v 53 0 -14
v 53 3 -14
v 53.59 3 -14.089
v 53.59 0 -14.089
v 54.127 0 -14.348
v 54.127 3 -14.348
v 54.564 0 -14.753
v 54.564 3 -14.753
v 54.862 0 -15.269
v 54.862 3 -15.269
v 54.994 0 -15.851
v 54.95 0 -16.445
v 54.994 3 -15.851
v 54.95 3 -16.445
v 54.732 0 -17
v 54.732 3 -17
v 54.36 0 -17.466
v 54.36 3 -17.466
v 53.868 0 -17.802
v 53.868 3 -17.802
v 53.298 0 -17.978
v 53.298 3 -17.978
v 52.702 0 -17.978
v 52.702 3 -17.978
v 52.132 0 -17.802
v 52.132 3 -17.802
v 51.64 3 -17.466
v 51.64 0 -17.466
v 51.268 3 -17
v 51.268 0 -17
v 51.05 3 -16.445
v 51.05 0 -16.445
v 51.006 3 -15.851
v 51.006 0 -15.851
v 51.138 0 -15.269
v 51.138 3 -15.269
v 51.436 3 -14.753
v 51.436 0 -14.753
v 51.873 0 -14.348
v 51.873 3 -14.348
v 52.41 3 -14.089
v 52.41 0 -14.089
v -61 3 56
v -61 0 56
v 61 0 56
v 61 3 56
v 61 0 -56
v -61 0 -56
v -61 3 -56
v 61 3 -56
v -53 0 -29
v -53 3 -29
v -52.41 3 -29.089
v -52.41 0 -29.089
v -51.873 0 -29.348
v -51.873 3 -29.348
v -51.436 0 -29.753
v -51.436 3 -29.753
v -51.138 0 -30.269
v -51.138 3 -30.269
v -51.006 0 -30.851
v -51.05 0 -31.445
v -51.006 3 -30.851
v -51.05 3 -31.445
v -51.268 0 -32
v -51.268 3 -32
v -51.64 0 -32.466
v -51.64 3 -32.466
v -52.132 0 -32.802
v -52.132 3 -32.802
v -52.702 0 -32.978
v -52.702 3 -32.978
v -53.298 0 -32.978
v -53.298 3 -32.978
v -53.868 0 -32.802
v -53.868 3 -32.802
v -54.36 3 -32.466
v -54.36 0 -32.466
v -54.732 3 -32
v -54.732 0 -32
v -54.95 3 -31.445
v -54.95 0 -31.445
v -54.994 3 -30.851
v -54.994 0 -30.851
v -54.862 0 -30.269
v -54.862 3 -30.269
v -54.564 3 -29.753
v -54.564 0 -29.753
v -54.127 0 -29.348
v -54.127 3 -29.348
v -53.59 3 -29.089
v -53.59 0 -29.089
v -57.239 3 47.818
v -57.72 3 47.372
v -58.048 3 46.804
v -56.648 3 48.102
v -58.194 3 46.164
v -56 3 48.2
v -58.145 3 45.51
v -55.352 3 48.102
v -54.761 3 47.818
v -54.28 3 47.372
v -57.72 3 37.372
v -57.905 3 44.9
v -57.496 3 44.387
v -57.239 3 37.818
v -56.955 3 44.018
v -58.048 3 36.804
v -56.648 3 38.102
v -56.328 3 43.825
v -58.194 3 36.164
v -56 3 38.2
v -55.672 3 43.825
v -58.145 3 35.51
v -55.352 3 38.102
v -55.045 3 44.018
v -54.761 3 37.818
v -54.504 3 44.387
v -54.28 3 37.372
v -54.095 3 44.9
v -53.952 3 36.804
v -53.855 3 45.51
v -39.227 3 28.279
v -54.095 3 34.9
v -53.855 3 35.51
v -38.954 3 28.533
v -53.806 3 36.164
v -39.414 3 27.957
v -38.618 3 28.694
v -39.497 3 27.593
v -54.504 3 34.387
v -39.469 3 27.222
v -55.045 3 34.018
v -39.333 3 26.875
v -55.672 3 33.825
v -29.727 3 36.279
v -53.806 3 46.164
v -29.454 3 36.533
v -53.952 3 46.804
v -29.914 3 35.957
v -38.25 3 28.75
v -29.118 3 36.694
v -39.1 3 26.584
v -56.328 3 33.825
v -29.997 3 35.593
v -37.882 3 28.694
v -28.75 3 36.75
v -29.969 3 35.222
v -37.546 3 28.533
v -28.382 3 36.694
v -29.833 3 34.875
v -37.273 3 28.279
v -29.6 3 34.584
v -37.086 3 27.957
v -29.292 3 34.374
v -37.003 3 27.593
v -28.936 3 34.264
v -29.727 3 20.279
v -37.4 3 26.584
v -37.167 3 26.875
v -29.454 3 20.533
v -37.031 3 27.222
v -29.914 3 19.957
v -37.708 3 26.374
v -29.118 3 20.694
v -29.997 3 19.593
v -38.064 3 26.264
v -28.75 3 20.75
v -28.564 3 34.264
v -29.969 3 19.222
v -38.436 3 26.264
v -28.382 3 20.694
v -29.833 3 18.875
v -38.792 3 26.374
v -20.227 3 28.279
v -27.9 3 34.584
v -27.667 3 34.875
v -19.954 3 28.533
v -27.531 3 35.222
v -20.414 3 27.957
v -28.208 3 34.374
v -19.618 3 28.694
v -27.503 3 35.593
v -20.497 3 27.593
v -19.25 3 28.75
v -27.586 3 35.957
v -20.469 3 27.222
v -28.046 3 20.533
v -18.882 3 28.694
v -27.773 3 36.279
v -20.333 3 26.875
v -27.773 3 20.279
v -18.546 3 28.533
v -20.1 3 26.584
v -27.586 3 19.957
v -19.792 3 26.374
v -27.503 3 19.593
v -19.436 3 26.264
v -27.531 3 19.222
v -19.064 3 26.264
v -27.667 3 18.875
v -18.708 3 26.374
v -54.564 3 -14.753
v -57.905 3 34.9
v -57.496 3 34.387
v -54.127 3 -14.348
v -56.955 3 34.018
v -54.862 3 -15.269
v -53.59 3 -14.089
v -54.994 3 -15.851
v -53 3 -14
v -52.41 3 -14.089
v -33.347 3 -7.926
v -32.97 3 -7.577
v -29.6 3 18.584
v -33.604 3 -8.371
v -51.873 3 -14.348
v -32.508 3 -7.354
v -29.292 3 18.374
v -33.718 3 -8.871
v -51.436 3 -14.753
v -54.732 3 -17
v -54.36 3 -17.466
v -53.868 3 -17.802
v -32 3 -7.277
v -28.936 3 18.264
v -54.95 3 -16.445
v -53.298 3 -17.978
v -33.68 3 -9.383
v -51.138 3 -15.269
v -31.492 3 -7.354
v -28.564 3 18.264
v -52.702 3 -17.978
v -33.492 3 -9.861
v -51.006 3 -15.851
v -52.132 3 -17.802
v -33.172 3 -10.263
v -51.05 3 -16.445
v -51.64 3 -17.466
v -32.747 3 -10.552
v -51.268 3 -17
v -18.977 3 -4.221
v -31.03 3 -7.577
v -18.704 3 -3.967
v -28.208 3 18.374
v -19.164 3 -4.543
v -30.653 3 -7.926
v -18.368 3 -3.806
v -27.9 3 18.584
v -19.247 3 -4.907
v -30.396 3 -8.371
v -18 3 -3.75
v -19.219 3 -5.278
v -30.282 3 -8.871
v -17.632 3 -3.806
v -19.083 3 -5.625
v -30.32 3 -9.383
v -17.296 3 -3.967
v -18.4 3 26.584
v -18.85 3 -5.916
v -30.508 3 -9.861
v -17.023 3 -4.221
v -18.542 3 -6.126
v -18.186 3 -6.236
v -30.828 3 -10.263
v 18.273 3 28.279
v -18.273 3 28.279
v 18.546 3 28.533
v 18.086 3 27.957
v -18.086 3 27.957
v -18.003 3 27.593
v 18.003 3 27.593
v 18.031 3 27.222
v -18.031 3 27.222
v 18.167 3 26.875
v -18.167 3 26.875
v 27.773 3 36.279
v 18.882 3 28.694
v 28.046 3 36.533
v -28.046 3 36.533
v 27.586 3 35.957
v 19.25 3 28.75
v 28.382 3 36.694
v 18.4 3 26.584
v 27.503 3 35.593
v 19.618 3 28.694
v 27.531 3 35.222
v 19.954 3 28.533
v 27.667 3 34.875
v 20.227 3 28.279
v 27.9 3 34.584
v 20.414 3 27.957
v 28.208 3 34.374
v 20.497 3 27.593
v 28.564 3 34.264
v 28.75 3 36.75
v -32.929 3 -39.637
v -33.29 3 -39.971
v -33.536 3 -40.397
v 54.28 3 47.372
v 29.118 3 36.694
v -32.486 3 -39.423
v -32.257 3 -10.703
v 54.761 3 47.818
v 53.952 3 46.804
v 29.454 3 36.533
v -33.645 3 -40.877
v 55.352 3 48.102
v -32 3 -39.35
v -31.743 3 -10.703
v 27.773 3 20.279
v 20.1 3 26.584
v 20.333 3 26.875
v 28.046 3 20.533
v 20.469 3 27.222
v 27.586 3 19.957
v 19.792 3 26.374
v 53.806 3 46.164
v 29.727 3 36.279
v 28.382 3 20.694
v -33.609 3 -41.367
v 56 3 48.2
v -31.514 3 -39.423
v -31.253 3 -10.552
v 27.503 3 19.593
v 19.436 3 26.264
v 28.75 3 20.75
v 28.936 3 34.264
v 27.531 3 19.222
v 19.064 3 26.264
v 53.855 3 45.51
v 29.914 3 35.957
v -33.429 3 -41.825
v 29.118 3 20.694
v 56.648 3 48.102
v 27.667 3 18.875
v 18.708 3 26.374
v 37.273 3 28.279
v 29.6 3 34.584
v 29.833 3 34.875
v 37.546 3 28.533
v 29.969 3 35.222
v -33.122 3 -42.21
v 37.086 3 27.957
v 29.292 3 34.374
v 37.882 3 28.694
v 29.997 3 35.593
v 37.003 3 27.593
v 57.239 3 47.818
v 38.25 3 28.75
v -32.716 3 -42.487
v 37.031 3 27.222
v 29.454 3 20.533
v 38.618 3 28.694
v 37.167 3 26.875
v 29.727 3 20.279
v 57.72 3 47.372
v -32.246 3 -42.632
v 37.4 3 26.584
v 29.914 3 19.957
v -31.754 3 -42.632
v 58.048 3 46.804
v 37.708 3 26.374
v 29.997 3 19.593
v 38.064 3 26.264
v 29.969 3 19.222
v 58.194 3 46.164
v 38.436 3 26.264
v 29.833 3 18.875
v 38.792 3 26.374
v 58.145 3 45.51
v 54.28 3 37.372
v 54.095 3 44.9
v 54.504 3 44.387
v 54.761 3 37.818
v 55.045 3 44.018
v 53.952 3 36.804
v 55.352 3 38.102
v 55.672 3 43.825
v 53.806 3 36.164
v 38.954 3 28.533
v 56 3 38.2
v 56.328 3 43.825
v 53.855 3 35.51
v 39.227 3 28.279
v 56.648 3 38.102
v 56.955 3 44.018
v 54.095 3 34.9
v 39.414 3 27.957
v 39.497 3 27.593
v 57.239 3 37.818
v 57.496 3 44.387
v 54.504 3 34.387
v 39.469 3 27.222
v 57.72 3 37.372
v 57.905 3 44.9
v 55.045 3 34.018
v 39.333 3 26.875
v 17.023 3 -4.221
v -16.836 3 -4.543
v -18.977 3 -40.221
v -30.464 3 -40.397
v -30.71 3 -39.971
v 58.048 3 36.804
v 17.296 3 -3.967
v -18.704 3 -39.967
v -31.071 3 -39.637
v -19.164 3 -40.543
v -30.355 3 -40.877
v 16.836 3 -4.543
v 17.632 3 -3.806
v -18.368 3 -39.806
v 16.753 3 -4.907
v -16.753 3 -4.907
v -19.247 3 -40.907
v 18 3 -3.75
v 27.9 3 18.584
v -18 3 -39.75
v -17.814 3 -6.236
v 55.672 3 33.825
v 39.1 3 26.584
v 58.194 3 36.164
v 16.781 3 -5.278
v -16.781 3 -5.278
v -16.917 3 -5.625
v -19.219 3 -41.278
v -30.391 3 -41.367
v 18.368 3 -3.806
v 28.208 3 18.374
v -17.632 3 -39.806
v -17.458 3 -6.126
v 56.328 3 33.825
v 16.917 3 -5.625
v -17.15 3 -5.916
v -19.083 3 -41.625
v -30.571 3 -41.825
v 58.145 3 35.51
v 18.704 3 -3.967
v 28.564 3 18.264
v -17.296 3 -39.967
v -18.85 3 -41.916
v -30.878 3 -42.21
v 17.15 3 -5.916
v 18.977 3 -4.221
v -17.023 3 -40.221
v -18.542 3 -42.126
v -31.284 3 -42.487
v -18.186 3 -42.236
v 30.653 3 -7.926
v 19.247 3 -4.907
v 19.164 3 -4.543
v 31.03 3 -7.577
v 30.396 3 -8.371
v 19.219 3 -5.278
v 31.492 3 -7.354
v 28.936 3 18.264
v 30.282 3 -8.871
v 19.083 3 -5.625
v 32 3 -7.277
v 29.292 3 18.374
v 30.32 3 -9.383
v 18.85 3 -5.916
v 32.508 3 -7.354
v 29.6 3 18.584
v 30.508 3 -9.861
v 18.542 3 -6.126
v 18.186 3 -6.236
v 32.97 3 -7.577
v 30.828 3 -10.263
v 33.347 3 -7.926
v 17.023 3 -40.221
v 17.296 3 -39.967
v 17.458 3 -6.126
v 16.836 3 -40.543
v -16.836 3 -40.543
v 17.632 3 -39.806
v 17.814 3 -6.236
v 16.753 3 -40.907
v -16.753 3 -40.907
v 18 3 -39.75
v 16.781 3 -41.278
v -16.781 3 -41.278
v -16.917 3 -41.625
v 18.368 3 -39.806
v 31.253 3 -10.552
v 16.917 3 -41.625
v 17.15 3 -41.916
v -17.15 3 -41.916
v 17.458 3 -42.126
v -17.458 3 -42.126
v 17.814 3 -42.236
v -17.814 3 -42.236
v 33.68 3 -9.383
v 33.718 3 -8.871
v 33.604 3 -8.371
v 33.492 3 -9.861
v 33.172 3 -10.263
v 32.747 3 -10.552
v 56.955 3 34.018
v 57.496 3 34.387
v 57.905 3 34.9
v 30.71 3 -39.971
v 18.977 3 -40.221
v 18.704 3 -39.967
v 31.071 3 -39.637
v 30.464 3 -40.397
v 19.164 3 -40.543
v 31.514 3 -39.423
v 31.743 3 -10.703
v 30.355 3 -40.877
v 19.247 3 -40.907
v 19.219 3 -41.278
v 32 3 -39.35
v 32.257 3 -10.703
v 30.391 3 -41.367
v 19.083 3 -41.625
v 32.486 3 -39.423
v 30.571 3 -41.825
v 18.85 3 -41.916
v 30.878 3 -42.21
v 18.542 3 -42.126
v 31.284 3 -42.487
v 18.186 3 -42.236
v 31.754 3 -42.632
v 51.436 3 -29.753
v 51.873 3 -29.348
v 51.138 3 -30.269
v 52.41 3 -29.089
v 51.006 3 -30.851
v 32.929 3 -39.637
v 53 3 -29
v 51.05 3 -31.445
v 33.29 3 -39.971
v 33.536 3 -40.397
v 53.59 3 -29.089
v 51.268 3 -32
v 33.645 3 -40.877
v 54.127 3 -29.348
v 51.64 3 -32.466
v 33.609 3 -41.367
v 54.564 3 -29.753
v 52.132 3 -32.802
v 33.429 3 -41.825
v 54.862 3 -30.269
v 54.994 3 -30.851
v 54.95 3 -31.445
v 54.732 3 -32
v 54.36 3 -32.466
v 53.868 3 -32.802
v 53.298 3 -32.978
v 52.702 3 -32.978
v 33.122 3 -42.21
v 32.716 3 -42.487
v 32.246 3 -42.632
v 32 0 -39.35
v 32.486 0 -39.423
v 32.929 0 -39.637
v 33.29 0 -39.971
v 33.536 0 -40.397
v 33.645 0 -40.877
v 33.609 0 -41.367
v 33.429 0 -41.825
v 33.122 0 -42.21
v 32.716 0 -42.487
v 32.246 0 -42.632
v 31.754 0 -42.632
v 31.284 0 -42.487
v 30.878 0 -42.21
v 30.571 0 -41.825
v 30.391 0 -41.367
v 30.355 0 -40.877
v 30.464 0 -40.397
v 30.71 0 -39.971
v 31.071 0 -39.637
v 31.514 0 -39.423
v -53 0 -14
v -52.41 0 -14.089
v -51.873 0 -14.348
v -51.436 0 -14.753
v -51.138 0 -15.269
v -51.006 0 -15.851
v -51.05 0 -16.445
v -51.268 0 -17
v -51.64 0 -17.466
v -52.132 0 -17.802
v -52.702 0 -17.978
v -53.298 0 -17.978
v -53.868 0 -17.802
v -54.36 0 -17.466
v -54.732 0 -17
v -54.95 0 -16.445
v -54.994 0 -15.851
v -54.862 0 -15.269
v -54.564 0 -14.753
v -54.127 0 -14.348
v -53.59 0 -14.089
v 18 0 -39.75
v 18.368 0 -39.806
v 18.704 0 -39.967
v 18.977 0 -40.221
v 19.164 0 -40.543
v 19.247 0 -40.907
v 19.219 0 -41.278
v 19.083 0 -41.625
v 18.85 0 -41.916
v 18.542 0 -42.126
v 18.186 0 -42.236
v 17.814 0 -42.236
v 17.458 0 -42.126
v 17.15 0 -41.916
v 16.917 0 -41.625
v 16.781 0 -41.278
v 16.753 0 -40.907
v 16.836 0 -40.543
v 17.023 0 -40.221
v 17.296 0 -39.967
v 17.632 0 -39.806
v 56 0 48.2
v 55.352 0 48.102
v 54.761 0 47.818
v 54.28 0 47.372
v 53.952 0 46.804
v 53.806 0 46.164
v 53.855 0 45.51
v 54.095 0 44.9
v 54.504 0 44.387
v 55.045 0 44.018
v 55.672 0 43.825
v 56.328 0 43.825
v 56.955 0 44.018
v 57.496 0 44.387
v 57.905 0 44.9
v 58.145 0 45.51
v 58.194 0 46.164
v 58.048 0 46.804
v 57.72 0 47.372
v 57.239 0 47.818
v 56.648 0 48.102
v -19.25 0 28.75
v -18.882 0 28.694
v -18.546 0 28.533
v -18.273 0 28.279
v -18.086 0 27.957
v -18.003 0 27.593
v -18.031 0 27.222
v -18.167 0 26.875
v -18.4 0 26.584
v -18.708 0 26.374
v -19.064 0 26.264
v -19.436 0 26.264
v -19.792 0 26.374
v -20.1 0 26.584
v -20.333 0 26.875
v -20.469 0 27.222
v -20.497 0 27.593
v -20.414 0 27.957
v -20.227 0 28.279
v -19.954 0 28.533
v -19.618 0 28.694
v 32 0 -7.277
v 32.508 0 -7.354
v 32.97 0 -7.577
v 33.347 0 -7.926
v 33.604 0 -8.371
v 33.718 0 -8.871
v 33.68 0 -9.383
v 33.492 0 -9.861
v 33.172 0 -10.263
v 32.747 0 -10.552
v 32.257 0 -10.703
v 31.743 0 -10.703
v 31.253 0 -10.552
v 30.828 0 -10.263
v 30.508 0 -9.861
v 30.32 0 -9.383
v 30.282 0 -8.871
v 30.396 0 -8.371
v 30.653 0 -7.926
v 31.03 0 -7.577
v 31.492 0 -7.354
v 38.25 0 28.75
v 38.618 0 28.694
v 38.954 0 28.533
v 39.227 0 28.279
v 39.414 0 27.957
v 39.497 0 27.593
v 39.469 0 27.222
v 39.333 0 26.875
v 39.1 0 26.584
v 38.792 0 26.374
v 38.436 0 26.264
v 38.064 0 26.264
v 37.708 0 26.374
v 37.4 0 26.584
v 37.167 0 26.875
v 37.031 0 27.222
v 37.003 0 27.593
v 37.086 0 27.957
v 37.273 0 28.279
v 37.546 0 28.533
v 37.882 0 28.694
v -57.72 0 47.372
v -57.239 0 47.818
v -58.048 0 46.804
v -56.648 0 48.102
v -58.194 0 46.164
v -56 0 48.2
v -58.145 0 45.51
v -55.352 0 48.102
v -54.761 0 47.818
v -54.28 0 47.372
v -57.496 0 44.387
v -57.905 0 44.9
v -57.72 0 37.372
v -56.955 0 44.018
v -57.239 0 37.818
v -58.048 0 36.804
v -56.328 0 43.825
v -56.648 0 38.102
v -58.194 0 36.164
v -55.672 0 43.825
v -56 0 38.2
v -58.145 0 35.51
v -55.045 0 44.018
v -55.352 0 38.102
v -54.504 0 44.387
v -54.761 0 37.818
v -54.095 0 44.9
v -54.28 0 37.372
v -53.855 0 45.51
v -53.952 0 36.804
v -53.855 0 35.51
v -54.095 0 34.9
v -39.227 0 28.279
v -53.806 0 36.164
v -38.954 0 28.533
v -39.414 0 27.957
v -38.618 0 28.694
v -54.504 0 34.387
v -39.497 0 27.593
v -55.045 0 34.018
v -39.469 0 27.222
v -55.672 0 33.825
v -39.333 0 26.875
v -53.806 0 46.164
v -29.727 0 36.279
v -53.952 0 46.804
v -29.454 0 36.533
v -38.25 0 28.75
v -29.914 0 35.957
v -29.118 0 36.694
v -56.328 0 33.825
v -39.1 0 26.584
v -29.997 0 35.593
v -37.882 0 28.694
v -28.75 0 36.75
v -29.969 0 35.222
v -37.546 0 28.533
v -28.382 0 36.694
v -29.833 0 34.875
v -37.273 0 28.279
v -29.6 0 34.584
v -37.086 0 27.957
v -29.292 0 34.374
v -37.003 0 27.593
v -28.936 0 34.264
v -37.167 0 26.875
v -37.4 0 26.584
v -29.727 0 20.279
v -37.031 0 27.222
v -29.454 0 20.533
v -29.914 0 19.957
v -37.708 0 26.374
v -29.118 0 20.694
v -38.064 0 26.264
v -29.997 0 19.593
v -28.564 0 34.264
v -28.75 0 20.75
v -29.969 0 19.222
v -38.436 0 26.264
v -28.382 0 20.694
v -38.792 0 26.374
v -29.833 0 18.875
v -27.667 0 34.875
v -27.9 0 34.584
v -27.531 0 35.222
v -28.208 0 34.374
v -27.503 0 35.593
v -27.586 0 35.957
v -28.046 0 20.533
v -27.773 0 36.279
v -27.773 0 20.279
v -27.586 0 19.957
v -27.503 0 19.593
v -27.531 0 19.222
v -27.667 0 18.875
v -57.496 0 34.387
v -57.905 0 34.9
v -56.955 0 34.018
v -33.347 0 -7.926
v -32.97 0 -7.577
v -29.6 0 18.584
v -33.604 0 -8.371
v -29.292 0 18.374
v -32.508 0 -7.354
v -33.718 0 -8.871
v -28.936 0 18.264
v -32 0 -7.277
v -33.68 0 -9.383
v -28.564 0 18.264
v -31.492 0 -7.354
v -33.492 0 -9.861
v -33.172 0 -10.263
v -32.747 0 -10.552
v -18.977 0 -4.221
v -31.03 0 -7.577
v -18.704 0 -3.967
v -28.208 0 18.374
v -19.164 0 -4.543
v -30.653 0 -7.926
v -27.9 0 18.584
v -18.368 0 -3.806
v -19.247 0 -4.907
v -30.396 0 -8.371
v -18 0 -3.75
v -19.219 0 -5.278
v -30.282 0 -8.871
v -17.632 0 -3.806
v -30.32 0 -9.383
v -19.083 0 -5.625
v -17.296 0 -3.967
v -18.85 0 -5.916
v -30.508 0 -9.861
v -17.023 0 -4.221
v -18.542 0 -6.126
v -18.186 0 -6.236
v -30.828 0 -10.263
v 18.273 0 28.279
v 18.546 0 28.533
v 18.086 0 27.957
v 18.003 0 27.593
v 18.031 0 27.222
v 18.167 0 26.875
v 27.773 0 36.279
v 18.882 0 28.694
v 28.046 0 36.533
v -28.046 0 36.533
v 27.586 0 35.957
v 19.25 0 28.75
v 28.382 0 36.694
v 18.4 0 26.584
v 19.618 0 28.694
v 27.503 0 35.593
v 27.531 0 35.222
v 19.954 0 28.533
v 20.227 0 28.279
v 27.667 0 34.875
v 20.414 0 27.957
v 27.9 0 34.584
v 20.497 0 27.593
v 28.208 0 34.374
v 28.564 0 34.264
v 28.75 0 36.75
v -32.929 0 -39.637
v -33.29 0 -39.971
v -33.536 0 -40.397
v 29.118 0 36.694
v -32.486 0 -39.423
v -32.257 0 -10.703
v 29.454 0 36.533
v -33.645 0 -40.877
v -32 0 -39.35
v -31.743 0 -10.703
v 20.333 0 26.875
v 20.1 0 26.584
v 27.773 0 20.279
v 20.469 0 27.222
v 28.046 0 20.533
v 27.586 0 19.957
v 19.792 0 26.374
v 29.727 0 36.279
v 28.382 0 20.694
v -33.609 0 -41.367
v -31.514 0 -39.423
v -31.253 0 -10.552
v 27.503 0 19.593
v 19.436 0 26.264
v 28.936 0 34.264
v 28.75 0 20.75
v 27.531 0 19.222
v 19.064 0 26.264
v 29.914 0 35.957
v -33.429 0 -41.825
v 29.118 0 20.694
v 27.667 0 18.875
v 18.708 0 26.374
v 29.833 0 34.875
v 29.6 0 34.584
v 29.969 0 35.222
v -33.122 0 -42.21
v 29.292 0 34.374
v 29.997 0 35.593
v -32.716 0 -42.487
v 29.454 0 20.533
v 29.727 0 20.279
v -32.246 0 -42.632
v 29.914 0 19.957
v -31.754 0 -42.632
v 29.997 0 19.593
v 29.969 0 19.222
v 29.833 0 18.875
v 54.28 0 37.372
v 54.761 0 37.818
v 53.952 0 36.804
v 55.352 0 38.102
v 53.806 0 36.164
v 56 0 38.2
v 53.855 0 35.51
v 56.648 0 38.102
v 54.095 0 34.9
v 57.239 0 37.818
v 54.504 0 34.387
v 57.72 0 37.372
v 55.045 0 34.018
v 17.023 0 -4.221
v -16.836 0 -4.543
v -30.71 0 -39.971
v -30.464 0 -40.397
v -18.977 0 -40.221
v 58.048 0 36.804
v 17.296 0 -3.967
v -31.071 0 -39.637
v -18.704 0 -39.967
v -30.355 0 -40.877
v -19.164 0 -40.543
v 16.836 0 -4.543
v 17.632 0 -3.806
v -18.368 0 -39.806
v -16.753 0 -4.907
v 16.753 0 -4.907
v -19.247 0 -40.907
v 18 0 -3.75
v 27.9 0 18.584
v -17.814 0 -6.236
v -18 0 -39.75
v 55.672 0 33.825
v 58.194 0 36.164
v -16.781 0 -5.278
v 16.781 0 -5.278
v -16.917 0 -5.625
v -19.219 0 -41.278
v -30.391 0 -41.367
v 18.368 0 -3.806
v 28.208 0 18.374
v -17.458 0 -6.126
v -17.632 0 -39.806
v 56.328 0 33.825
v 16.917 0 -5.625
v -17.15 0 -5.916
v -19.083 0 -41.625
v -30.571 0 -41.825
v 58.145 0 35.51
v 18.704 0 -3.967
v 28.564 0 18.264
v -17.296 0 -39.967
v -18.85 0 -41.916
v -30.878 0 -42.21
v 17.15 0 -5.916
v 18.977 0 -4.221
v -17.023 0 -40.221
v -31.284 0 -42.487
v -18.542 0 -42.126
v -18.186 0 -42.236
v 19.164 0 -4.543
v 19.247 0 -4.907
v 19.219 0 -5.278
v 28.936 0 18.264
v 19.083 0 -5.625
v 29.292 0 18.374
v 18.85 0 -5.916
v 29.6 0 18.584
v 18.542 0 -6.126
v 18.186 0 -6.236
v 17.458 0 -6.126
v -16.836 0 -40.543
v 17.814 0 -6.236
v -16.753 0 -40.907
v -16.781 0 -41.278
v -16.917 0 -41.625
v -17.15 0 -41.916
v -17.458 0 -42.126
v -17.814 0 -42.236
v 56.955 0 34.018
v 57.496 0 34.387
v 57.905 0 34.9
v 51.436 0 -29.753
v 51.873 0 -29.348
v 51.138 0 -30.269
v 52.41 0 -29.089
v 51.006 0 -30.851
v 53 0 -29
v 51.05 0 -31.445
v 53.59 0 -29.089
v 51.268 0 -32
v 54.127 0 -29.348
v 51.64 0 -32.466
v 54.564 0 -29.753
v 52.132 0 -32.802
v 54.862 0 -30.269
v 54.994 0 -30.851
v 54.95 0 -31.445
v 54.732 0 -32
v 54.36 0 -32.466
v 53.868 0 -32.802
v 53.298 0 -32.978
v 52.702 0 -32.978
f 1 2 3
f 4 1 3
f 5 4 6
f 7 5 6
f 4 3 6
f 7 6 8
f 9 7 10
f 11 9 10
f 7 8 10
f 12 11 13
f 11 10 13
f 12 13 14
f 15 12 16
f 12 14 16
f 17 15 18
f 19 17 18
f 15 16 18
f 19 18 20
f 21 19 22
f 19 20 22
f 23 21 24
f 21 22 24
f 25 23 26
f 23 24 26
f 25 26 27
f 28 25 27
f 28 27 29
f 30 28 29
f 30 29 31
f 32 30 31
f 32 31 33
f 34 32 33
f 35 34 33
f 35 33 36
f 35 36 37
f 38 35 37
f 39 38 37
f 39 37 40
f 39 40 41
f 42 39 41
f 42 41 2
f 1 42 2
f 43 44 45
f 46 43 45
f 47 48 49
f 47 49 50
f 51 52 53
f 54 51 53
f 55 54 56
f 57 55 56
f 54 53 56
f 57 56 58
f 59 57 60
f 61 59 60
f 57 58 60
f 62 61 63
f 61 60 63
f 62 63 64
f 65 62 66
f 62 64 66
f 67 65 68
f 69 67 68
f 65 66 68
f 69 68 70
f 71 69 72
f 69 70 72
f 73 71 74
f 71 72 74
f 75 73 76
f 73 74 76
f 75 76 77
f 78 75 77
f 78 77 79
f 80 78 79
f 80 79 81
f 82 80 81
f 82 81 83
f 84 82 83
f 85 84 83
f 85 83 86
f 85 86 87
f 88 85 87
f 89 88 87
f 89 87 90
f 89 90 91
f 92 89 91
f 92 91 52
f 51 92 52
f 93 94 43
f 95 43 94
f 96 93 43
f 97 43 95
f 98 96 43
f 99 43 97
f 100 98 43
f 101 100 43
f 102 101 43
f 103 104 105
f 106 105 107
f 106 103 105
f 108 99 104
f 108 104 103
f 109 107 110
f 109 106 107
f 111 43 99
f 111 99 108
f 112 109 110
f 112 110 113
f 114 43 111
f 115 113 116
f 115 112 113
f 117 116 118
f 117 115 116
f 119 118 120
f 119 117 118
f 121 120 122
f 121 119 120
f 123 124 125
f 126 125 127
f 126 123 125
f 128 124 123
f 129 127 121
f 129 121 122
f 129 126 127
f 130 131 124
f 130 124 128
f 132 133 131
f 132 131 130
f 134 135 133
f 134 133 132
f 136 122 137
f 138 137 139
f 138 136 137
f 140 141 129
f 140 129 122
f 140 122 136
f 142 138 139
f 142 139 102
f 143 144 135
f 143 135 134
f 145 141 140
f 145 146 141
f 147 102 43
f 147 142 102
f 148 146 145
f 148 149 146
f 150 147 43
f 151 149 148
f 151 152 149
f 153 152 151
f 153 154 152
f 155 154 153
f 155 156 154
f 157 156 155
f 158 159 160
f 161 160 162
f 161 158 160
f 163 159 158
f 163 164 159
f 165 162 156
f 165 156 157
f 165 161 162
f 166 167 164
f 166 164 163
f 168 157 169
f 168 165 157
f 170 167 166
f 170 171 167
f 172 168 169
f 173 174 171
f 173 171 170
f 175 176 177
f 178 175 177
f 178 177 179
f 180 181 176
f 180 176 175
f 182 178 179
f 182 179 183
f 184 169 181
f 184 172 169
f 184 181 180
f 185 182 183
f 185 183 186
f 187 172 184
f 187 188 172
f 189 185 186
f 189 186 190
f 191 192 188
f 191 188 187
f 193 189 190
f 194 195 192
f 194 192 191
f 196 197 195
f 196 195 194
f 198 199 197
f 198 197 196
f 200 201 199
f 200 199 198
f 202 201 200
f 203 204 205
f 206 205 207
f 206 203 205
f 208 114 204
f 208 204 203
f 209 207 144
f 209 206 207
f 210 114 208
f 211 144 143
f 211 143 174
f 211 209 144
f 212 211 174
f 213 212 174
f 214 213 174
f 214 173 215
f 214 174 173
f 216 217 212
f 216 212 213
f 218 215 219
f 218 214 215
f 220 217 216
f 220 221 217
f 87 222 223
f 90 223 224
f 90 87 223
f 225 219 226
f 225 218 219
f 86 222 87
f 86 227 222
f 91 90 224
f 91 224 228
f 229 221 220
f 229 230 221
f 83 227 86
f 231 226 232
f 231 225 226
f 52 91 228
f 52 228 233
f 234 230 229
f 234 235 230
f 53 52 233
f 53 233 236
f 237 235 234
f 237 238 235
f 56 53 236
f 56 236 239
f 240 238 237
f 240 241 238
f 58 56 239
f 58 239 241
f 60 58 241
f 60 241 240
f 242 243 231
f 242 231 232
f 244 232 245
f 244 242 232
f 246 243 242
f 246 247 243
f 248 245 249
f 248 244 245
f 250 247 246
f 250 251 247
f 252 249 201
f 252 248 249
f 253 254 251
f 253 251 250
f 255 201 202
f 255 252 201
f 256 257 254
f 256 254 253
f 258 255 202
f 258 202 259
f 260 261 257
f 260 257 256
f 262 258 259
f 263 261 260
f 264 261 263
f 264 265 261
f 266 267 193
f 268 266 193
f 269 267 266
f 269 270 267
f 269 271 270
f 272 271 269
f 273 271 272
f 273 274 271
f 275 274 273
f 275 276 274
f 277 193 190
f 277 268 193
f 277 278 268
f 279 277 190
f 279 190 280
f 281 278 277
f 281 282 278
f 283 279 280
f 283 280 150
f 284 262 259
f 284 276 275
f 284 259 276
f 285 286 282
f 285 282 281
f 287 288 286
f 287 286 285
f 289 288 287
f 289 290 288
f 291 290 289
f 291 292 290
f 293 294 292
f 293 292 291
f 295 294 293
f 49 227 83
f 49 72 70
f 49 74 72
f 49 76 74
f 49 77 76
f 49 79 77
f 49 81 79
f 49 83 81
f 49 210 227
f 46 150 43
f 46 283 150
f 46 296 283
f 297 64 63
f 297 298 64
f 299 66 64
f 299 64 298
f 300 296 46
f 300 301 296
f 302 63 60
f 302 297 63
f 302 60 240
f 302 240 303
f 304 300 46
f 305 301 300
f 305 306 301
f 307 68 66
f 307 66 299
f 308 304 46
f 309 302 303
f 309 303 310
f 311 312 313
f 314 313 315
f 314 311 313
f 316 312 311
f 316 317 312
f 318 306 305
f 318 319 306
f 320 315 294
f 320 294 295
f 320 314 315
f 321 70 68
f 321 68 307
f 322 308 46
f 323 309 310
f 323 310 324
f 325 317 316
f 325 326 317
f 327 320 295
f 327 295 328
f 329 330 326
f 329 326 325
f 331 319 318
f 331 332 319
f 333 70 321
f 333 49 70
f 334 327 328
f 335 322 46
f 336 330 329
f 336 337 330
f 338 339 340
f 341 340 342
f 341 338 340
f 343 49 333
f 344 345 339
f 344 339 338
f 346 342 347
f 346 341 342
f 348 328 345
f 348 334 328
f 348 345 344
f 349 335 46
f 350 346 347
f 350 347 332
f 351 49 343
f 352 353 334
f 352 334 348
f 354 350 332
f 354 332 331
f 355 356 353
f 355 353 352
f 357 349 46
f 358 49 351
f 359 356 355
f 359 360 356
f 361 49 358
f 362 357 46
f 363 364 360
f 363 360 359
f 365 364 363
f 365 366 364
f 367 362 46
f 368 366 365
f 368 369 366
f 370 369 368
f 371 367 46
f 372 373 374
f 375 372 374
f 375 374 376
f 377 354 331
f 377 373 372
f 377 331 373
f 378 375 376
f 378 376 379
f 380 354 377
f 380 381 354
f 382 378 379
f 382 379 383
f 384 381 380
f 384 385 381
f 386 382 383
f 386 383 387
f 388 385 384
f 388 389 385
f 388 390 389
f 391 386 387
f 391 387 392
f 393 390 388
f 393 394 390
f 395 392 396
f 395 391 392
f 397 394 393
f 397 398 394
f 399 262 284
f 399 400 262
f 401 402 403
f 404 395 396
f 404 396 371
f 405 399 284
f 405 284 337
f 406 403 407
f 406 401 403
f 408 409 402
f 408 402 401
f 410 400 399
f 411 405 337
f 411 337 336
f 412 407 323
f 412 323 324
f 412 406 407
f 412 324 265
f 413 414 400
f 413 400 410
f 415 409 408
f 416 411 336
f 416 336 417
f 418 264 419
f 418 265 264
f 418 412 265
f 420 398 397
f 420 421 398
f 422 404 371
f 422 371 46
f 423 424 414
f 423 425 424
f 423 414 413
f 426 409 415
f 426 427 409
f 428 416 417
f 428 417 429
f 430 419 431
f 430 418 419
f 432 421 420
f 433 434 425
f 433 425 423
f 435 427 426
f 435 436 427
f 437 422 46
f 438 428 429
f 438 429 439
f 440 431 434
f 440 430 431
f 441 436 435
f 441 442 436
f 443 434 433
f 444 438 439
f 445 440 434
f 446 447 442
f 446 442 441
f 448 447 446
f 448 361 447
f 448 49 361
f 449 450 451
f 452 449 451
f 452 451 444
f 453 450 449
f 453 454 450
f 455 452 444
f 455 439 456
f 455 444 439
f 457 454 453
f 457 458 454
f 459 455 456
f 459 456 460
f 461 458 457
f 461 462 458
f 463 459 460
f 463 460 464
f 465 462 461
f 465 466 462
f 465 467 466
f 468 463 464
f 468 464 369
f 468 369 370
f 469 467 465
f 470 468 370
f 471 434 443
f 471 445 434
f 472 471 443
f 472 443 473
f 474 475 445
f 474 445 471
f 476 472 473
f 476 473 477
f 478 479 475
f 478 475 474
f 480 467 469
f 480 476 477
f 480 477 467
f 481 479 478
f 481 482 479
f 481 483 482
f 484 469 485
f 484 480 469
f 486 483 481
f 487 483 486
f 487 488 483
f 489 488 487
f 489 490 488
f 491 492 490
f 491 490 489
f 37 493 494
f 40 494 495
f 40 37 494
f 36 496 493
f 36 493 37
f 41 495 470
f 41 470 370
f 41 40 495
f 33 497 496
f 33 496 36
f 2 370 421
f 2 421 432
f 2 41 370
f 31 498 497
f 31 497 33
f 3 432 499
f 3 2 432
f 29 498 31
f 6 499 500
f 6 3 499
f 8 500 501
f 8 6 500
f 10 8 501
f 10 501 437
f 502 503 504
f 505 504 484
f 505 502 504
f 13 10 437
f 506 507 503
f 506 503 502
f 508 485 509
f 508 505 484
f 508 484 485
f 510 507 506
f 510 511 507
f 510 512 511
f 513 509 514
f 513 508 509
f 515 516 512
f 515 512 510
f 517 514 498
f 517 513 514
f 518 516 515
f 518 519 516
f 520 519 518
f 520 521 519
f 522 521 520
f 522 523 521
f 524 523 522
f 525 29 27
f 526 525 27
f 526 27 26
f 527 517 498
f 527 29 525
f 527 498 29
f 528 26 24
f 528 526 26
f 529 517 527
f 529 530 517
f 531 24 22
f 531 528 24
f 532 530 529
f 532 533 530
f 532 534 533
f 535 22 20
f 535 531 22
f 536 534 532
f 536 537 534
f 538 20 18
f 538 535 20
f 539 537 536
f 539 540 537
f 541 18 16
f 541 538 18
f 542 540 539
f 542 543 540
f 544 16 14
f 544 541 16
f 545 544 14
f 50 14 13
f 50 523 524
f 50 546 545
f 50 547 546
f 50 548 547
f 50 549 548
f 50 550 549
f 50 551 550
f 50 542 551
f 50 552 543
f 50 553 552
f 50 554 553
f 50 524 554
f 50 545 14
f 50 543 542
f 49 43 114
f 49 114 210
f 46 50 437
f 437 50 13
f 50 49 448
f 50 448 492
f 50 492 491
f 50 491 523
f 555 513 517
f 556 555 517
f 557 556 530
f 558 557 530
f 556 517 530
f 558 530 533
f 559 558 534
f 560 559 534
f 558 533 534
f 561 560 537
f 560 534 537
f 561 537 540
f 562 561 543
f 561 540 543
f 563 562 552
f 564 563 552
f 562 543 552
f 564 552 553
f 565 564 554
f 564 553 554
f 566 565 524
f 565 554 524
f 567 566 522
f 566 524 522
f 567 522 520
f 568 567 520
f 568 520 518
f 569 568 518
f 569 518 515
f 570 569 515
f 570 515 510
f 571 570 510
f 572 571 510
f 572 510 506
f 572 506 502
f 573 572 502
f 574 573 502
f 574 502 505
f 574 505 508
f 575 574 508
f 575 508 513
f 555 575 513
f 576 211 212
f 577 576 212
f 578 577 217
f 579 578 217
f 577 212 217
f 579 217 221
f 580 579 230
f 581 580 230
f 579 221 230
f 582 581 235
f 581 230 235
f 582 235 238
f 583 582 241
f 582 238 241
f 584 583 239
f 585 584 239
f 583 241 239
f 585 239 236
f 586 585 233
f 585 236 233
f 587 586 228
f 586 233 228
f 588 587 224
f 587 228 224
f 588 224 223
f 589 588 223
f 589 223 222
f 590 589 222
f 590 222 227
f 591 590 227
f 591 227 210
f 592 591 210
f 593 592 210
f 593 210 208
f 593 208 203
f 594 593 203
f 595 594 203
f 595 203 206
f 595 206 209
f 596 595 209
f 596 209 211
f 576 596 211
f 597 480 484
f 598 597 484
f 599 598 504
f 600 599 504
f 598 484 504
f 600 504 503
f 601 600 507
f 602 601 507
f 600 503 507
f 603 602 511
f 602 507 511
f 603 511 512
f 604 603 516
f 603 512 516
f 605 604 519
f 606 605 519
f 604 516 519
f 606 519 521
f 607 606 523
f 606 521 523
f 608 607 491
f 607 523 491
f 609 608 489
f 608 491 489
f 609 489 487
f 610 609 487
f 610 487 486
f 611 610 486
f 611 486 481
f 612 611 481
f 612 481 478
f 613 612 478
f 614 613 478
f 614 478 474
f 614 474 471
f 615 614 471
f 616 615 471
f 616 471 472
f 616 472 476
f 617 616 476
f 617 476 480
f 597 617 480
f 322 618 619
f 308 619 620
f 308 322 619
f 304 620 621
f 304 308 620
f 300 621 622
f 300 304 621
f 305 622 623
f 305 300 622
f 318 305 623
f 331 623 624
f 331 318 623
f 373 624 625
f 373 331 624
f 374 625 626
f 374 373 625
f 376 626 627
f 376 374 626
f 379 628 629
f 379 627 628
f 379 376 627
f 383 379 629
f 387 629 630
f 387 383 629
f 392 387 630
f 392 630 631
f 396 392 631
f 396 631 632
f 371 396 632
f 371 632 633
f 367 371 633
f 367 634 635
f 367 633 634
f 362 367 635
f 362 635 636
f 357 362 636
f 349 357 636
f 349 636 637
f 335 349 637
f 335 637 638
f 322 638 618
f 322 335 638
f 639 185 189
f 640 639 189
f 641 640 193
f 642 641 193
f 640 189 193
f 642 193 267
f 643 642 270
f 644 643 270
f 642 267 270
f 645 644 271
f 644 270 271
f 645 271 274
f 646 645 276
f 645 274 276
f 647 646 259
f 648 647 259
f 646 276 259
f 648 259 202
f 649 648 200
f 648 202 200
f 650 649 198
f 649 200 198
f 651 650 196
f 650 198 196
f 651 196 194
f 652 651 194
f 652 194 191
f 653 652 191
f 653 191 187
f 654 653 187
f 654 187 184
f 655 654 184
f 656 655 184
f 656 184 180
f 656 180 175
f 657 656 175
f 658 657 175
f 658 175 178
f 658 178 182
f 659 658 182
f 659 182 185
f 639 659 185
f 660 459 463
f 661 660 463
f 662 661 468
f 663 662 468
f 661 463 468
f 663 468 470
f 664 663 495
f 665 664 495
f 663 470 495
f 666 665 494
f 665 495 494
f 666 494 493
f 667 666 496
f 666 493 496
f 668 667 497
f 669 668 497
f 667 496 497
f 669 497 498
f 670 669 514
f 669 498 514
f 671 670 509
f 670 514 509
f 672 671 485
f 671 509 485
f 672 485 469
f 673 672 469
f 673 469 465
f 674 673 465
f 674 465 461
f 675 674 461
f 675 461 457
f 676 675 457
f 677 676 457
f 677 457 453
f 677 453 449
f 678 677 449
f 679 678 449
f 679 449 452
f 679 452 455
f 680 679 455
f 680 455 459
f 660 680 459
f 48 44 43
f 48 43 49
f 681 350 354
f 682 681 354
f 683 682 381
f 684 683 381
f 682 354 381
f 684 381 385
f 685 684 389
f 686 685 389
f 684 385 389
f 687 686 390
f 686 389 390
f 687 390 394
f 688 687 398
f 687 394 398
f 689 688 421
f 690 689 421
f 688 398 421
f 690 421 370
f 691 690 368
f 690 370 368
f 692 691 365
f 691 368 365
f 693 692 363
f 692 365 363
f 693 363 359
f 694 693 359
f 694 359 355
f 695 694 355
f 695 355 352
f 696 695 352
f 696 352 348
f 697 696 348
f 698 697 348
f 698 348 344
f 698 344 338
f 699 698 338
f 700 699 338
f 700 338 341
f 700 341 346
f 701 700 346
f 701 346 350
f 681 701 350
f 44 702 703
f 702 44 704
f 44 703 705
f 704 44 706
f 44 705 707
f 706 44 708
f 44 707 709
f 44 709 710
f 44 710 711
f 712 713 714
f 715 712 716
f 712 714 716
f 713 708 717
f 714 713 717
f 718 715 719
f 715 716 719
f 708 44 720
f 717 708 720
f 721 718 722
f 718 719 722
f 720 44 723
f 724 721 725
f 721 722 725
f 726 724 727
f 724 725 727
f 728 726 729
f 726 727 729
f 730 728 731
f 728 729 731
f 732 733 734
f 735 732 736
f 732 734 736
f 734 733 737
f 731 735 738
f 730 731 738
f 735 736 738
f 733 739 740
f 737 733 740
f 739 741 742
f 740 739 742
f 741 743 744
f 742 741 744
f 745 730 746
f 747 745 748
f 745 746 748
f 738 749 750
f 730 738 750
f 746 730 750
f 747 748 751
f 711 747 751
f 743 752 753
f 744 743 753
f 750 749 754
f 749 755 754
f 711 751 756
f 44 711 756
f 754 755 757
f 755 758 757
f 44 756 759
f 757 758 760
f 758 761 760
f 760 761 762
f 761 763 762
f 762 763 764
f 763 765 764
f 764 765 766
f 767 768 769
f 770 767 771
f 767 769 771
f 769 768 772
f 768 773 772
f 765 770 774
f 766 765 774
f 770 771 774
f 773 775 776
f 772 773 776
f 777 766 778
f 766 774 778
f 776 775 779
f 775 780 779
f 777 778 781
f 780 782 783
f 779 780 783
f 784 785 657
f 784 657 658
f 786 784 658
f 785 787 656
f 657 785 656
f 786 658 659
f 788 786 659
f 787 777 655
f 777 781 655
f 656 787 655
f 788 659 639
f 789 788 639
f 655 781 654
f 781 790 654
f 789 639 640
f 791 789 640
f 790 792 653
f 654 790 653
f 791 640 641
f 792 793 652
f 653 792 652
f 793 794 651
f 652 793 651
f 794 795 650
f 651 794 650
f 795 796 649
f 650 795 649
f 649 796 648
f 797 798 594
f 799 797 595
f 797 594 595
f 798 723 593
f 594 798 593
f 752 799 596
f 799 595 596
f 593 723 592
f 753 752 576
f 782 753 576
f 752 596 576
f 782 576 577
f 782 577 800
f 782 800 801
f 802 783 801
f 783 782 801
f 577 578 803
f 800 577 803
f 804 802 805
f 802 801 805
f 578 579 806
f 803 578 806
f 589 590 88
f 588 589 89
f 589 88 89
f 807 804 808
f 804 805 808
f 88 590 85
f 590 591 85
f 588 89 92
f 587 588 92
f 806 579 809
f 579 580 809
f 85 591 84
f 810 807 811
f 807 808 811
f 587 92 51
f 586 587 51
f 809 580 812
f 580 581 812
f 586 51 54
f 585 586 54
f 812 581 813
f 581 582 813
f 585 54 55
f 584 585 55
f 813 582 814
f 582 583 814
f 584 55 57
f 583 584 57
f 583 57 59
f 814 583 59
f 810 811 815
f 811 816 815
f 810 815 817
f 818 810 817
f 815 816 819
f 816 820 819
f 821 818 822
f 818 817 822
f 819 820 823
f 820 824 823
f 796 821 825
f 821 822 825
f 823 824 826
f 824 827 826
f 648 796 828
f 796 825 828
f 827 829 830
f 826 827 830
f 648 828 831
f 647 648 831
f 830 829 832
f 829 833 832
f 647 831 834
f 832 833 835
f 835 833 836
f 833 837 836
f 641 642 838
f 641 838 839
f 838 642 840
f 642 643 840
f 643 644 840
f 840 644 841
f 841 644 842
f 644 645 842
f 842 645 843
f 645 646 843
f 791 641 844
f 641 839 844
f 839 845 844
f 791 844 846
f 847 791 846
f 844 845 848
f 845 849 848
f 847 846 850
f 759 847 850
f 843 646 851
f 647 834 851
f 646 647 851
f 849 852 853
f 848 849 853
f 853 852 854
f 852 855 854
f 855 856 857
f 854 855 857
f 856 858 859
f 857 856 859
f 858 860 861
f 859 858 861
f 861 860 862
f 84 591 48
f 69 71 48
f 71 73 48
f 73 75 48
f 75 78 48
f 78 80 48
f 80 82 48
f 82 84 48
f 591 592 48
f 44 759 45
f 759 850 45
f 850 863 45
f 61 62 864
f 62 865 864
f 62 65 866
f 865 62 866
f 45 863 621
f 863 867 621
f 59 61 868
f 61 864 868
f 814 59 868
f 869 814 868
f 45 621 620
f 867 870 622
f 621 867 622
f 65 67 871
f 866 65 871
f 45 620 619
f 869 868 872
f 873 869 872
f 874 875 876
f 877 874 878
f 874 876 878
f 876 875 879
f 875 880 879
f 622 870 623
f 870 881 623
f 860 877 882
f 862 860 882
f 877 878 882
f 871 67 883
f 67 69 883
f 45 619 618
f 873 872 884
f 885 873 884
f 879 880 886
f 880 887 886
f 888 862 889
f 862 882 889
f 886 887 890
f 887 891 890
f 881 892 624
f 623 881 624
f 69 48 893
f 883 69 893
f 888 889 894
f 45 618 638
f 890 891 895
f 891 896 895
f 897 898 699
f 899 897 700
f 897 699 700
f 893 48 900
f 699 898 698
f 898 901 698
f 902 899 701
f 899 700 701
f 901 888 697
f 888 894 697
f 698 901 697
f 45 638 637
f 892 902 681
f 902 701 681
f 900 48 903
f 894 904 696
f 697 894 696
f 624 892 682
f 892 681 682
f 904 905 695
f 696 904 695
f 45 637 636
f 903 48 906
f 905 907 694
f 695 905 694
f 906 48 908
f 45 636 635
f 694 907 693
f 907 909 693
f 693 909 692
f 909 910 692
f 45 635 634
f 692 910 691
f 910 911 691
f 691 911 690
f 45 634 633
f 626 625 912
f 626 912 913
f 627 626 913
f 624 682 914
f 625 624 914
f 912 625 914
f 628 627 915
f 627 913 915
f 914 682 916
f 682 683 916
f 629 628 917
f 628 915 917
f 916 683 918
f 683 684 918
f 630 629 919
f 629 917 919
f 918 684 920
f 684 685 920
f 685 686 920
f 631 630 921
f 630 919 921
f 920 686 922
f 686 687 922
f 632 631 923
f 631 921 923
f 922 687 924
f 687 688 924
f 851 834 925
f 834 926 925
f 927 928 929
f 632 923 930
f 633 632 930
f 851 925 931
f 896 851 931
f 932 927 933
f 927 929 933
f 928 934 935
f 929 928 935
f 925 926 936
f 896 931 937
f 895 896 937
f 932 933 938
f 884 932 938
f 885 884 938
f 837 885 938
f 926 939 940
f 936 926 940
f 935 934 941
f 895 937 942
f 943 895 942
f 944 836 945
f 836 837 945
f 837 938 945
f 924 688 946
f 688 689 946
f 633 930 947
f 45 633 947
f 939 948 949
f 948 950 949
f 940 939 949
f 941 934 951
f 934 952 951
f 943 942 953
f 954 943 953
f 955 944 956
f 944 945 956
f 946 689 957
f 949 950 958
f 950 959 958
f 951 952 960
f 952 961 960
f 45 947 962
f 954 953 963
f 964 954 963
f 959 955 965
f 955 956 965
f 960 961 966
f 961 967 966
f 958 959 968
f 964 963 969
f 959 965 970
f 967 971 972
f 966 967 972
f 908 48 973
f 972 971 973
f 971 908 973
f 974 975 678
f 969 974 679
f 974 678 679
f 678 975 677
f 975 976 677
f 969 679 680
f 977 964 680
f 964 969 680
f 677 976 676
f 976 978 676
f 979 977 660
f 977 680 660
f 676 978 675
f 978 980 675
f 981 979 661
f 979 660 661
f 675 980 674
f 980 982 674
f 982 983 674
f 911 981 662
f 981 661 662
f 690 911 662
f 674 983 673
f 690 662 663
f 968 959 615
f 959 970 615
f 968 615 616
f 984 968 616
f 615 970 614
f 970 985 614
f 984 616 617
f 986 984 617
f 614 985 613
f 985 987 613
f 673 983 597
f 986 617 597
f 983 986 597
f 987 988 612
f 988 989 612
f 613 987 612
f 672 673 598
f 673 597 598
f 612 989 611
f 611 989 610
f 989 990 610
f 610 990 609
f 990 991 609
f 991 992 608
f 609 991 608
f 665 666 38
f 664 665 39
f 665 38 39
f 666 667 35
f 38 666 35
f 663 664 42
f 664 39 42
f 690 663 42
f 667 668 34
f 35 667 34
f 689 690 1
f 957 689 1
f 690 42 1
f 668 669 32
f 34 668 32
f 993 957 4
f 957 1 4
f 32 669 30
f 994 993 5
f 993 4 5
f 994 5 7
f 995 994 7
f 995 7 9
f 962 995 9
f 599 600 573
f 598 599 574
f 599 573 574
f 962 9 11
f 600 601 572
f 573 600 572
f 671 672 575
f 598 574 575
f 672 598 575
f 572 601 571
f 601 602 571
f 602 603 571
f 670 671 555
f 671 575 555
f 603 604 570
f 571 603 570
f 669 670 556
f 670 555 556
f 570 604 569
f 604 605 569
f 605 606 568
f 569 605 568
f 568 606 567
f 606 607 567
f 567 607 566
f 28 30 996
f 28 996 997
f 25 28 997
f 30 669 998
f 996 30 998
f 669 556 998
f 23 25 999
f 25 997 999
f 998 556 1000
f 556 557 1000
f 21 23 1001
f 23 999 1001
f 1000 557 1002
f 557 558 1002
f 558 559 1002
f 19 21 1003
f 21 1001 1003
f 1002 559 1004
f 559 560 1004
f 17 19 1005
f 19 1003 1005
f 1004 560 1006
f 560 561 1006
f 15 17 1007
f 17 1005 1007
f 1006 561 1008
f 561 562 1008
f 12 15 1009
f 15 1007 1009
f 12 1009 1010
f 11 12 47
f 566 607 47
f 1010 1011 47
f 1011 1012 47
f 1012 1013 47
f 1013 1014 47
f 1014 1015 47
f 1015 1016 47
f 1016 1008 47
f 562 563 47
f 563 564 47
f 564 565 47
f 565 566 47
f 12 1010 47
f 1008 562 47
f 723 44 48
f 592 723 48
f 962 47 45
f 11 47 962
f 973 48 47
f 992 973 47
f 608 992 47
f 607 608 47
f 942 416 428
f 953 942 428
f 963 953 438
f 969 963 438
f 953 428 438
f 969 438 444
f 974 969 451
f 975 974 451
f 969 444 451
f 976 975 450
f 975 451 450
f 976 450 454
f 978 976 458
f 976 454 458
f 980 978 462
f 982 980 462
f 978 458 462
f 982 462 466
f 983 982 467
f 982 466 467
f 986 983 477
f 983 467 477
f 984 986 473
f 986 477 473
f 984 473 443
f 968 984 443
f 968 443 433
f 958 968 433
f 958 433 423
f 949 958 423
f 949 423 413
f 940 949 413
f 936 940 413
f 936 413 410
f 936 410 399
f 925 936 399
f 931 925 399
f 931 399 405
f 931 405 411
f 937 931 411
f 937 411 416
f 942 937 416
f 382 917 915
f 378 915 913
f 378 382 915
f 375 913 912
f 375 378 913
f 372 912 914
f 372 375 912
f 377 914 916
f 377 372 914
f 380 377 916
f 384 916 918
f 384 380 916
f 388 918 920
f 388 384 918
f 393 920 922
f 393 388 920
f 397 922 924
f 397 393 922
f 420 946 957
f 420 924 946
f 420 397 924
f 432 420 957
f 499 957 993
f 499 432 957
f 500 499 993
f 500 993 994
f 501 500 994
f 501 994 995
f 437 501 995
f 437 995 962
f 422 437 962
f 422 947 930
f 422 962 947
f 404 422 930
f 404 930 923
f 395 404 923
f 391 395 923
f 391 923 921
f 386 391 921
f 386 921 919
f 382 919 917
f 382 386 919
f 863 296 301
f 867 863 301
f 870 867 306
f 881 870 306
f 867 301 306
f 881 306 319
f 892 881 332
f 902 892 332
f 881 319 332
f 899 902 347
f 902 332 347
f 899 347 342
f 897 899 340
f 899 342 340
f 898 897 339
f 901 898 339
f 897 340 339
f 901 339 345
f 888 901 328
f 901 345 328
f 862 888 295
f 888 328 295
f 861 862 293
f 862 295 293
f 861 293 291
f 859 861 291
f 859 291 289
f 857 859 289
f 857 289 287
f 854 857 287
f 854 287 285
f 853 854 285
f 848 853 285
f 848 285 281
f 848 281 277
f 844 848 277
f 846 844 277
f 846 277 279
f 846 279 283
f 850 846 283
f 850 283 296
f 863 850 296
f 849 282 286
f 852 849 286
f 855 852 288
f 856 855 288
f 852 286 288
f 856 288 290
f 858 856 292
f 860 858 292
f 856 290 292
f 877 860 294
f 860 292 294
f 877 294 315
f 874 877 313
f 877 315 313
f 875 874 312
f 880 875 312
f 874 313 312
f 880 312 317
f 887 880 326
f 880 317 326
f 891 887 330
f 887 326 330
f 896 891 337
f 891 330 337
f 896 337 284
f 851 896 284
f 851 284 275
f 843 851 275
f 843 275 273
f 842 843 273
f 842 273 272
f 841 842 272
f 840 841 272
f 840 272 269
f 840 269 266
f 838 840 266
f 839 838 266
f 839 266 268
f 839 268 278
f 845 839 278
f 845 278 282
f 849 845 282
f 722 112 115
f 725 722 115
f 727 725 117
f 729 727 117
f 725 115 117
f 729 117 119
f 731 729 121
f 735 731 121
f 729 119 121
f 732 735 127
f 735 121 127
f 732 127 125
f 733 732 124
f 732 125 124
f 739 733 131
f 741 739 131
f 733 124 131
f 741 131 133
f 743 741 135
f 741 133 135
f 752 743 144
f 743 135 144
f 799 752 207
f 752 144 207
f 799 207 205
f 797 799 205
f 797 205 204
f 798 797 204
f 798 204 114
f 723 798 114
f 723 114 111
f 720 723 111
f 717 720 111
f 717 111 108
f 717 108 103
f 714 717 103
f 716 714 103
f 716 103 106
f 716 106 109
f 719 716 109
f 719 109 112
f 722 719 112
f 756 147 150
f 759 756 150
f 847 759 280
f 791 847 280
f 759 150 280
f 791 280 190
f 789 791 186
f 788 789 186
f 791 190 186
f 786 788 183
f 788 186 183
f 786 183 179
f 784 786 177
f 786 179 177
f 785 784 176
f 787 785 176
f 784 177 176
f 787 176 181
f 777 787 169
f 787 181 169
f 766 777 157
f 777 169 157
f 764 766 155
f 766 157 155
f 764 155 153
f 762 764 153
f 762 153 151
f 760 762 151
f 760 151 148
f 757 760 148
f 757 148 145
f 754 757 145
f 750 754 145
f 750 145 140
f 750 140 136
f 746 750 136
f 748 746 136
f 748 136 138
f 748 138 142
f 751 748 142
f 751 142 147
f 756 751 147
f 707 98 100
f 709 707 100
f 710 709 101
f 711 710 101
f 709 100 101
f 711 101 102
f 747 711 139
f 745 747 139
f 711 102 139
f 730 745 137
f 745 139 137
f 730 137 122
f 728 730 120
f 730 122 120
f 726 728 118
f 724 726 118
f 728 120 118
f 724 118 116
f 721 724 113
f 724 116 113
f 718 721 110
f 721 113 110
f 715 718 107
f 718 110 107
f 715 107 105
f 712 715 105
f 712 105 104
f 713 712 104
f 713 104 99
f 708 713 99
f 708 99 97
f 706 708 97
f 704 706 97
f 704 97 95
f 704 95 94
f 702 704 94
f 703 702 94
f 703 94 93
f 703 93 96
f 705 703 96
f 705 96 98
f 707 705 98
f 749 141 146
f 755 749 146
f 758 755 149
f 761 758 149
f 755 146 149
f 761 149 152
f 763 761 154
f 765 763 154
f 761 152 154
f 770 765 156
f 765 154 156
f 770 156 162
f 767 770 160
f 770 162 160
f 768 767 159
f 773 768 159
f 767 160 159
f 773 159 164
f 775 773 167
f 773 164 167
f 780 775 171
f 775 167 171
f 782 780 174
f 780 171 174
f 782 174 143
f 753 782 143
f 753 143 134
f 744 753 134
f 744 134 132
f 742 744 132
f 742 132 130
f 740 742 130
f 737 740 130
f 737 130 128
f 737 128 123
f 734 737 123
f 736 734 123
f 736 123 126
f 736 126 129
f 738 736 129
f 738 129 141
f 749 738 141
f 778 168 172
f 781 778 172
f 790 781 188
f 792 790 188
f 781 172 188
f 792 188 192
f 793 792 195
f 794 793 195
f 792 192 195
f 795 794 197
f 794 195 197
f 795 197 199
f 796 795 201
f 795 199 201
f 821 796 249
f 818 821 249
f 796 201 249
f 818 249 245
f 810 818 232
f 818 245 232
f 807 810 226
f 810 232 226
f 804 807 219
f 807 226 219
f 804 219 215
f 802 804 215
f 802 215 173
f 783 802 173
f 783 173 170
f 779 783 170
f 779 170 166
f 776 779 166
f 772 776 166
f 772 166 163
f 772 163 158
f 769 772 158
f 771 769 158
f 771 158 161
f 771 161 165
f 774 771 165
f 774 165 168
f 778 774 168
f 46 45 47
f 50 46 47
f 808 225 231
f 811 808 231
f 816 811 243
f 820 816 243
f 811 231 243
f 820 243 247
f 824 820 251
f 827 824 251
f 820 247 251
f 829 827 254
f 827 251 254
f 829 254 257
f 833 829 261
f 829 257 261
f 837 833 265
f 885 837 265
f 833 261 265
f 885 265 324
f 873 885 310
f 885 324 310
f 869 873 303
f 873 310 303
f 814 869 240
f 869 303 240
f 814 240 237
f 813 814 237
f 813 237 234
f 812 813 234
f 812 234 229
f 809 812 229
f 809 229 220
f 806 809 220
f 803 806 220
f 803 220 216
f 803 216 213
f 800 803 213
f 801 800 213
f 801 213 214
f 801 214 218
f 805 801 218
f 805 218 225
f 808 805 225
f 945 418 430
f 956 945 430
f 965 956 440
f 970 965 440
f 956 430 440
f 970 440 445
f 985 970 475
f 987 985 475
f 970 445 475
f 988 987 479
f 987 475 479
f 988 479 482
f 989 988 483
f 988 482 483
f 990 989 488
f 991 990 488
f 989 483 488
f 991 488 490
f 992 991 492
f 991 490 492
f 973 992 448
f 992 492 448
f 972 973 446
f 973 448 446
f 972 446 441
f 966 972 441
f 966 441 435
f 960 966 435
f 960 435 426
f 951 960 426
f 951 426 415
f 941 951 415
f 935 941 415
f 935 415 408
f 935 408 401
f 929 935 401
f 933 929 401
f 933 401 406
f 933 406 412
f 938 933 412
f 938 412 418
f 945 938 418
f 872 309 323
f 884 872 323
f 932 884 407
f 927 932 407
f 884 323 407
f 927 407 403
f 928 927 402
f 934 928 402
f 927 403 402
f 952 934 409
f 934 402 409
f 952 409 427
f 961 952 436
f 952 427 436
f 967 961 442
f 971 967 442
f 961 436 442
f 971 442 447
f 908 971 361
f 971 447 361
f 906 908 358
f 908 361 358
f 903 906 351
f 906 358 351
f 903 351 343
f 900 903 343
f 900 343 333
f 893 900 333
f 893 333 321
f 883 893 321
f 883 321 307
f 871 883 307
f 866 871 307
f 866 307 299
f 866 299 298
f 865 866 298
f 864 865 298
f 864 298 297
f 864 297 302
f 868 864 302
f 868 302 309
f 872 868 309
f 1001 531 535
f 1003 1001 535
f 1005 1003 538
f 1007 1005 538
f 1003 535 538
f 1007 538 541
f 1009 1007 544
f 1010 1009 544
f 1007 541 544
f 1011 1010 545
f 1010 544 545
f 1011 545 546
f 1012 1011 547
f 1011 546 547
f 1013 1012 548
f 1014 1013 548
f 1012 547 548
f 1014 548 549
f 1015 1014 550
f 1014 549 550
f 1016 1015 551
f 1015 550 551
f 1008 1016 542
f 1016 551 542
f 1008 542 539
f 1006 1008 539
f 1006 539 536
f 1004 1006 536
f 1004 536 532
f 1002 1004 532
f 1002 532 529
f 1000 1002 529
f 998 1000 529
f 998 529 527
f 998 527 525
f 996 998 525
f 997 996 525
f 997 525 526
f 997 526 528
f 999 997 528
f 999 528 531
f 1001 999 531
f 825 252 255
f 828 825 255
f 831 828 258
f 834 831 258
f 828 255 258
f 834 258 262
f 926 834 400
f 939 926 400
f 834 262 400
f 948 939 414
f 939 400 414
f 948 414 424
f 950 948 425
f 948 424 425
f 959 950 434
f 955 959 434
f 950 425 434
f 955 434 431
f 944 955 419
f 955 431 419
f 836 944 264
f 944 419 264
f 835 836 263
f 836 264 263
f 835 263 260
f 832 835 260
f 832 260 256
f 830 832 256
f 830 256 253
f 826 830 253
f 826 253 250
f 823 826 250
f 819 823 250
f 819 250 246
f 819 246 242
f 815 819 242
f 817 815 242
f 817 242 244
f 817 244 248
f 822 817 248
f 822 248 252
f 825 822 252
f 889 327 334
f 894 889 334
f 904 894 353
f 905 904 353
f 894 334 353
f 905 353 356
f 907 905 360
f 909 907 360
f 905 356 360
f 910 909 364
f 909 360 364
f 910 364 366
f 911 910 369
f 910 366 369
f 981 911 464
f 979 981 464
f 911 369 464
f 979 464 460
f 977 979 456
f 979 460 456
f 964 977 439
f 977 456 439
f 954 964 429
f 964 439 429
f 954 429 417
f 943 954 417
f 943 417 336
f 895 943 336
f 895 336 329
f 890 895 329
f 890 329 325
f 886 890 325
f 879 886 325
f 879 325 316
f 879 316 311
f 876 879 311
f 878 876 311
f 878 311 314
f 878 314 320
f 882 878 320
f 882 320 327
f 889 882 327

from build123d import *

# Parameters (mm, degrees)
SKETCH1_W           = 122
SKETCH1_H           = 112
BOSS_EXTRUDE1_DEPTH = 3
SKETCH3_R           = 2
CUT_EXTRUDE2_DEPTH  = 10
SKETCH4_R           = 1.25
CUT_EXTRUDE3_DEPTH  = 23
SKETCH5_R           = 1.25
CUT_EXTRUDE4_DEPTH  = 23
SKETCH6_R           = 1.65
SKETCH6_R_2         = 1.722739023
CUT_EXTRUDE5_DEPTH  = 10
SKETCH7_R           = 2.2
CUT_EXTRUDE6_DEPTH  = 10


with BuildPart() as part:
    # Sketch1 → Boss-Extrude1 (new body)
    with BuildSketch(Plane(origin=(0, 0, 0), x_dir=(1, 0, 0), z_dir=(0, 1, 0))):
        Rectangle(SKETCH1_W, SKETCH1_H)
    extrude(amount=BOSS_EXTRUDE1_DEPTH)

    # Sketch3 → Cut-Extrude2 (cut)
    with BuildSketch(Plane(origin=(0, 3, 0), x_dir=(1, 0, 0), z_dir=(0, 1, 0))):
        with Locations(Location((-53, 31, 0), (0, 0, 270))):
            Circle(SKETCH3_R)
        with Locations(Location((-53, 16, 0), (0, 0, 270))):
            Circle(SKETCH3_R)
        with Locations(Location((53, 16, 0), (0, 0, 270))):
            Circle(SKETCH3_R)
        with Locations(Location((53, 31, 0), (0, 0, 270))):
            Circle(SKETCH3_R)
    extrude(amount=-CUT_EXTRUDE2_DEPTH, mode=Mode.SUBTRACT)

    # Sketch4 → Cut-Extrude3 (cut)
    with BuildSketch(Plane(origin=(0, 3, 0), x_dir=(1, 0, 0), z_dir=(0, 1, 0))):
        with Locations(Location((-18, 41, 0), (0, 0, 270))):
            Circle(SKETCH4_R)
        with Locations(Location((-18, 5, 0), (0, 0, 270))):
            Circle(SKETCH4_R)
        with Locations(Location((18, 5, 0), (0, 0, 270))):
            Circle(SKETCH4_R)
        with Locations(Location((18, 41, 0), (0, 0, 270))):
            Circle(SKETCH4_R)
    extrude(amount=-CUT_EXTRUDE3_DEPTH, mode=Mode.SUBTRACT)

    # Sketch5 → Cut-Extrude4 (cut)
    with BuildSketch(Plane(origin=(0, 3, 0), x_dir=(1, 0, 0), z_dir=(0, 1, 0))):
        with Locations(Location((-38.25, -27.5, 0), (0, 0, 270))):
            Circle(SKETCH5_R)
        with Locations(Location((-28.75, -19.5, 0), (0, 0, 270))):
            Circle(SKETCH5_R)
        with Locations(Location((-28.75, -35.5, 0), (0, 0, 270))):
            Circle(SKETCH5_R)
        with Locations(Location((-19.25, -27.5, 0), (0, 0, 270))):
            Circle(SKETCH5_R)
        with Locations(Location((38.25, -27.5, 0), (0, 0, 270))):
            Circle(SKETCH5_R)
        with Locations(Location((19.25, -27.5, 0), (0, 0, 270))):
            Circle(SKETCH5_R)
        with Locations(Location((28.75, -35.5, 0), (0, 0, 270))):
            Circle(SKETCH5_R)
        with Locations(Location((28.75, -19.5, 0), (0, 0, 270))):
            Circle(SKETCH5_R)
    extrude(amount=-CUT_EXTRUDE4_DEPTH, mode=Mode.SUBTRACT)

    # Sketch6 → Cut-Extrude5 (cut)
    with BuildSketch(Plane(origin=(0, 3, 0), x_dir=(1, 0, 0), z_dir=(0, 1, 0))):
        with Locations(Location((-32, 41, 0), (0, 0, 270))):
            Circle(SKETCH6_R)
        with Locations(Location((-32, 9, 0), (0, 0, 270))):
            Circle(SKETCH6_R_2)
        with Locations(Location((32, 9, 0), (0, 0, 270))):
            Circle(SKETCH6_R_2)
        with Locations(Location((32, 41, 0), (0, 0, 270))):
            Circle(SKETCH6_R)
    extrude(amount=-CUT_EXTRUDE5_DEPTH, mode=Mode.SUBTRACT)

    # Sketch7 → Cut-Extrude6 (cut)
    with BuildSketch(Plane(origin=(0, 3, 0), x_dir=(1, 0, 0), z_dir=(0, 1, 0))):
        with Locations(Location((-56, -46, 0), (0, 0, 270))):
            Circle(SKETCH7_R)
        with Locations(Location((-56, -36, 0), (0, 0, 270))):
            Circle(SKETCH7_R)
    cut_extrude6 = extrude(amount=-CUT_EXTRUDE6_DEPTH, mode=Mode.SUBTRACT)

    # Mirror1: Cut-Extrude6 across plane
    add(cut_extrude6.mirror(Plane(origin=(0, 0, 0), x_dir=(0, 0, 1), z_dir=(1, 0, 0))), mode=Mode.SUBTRACT)


solid = part.part
